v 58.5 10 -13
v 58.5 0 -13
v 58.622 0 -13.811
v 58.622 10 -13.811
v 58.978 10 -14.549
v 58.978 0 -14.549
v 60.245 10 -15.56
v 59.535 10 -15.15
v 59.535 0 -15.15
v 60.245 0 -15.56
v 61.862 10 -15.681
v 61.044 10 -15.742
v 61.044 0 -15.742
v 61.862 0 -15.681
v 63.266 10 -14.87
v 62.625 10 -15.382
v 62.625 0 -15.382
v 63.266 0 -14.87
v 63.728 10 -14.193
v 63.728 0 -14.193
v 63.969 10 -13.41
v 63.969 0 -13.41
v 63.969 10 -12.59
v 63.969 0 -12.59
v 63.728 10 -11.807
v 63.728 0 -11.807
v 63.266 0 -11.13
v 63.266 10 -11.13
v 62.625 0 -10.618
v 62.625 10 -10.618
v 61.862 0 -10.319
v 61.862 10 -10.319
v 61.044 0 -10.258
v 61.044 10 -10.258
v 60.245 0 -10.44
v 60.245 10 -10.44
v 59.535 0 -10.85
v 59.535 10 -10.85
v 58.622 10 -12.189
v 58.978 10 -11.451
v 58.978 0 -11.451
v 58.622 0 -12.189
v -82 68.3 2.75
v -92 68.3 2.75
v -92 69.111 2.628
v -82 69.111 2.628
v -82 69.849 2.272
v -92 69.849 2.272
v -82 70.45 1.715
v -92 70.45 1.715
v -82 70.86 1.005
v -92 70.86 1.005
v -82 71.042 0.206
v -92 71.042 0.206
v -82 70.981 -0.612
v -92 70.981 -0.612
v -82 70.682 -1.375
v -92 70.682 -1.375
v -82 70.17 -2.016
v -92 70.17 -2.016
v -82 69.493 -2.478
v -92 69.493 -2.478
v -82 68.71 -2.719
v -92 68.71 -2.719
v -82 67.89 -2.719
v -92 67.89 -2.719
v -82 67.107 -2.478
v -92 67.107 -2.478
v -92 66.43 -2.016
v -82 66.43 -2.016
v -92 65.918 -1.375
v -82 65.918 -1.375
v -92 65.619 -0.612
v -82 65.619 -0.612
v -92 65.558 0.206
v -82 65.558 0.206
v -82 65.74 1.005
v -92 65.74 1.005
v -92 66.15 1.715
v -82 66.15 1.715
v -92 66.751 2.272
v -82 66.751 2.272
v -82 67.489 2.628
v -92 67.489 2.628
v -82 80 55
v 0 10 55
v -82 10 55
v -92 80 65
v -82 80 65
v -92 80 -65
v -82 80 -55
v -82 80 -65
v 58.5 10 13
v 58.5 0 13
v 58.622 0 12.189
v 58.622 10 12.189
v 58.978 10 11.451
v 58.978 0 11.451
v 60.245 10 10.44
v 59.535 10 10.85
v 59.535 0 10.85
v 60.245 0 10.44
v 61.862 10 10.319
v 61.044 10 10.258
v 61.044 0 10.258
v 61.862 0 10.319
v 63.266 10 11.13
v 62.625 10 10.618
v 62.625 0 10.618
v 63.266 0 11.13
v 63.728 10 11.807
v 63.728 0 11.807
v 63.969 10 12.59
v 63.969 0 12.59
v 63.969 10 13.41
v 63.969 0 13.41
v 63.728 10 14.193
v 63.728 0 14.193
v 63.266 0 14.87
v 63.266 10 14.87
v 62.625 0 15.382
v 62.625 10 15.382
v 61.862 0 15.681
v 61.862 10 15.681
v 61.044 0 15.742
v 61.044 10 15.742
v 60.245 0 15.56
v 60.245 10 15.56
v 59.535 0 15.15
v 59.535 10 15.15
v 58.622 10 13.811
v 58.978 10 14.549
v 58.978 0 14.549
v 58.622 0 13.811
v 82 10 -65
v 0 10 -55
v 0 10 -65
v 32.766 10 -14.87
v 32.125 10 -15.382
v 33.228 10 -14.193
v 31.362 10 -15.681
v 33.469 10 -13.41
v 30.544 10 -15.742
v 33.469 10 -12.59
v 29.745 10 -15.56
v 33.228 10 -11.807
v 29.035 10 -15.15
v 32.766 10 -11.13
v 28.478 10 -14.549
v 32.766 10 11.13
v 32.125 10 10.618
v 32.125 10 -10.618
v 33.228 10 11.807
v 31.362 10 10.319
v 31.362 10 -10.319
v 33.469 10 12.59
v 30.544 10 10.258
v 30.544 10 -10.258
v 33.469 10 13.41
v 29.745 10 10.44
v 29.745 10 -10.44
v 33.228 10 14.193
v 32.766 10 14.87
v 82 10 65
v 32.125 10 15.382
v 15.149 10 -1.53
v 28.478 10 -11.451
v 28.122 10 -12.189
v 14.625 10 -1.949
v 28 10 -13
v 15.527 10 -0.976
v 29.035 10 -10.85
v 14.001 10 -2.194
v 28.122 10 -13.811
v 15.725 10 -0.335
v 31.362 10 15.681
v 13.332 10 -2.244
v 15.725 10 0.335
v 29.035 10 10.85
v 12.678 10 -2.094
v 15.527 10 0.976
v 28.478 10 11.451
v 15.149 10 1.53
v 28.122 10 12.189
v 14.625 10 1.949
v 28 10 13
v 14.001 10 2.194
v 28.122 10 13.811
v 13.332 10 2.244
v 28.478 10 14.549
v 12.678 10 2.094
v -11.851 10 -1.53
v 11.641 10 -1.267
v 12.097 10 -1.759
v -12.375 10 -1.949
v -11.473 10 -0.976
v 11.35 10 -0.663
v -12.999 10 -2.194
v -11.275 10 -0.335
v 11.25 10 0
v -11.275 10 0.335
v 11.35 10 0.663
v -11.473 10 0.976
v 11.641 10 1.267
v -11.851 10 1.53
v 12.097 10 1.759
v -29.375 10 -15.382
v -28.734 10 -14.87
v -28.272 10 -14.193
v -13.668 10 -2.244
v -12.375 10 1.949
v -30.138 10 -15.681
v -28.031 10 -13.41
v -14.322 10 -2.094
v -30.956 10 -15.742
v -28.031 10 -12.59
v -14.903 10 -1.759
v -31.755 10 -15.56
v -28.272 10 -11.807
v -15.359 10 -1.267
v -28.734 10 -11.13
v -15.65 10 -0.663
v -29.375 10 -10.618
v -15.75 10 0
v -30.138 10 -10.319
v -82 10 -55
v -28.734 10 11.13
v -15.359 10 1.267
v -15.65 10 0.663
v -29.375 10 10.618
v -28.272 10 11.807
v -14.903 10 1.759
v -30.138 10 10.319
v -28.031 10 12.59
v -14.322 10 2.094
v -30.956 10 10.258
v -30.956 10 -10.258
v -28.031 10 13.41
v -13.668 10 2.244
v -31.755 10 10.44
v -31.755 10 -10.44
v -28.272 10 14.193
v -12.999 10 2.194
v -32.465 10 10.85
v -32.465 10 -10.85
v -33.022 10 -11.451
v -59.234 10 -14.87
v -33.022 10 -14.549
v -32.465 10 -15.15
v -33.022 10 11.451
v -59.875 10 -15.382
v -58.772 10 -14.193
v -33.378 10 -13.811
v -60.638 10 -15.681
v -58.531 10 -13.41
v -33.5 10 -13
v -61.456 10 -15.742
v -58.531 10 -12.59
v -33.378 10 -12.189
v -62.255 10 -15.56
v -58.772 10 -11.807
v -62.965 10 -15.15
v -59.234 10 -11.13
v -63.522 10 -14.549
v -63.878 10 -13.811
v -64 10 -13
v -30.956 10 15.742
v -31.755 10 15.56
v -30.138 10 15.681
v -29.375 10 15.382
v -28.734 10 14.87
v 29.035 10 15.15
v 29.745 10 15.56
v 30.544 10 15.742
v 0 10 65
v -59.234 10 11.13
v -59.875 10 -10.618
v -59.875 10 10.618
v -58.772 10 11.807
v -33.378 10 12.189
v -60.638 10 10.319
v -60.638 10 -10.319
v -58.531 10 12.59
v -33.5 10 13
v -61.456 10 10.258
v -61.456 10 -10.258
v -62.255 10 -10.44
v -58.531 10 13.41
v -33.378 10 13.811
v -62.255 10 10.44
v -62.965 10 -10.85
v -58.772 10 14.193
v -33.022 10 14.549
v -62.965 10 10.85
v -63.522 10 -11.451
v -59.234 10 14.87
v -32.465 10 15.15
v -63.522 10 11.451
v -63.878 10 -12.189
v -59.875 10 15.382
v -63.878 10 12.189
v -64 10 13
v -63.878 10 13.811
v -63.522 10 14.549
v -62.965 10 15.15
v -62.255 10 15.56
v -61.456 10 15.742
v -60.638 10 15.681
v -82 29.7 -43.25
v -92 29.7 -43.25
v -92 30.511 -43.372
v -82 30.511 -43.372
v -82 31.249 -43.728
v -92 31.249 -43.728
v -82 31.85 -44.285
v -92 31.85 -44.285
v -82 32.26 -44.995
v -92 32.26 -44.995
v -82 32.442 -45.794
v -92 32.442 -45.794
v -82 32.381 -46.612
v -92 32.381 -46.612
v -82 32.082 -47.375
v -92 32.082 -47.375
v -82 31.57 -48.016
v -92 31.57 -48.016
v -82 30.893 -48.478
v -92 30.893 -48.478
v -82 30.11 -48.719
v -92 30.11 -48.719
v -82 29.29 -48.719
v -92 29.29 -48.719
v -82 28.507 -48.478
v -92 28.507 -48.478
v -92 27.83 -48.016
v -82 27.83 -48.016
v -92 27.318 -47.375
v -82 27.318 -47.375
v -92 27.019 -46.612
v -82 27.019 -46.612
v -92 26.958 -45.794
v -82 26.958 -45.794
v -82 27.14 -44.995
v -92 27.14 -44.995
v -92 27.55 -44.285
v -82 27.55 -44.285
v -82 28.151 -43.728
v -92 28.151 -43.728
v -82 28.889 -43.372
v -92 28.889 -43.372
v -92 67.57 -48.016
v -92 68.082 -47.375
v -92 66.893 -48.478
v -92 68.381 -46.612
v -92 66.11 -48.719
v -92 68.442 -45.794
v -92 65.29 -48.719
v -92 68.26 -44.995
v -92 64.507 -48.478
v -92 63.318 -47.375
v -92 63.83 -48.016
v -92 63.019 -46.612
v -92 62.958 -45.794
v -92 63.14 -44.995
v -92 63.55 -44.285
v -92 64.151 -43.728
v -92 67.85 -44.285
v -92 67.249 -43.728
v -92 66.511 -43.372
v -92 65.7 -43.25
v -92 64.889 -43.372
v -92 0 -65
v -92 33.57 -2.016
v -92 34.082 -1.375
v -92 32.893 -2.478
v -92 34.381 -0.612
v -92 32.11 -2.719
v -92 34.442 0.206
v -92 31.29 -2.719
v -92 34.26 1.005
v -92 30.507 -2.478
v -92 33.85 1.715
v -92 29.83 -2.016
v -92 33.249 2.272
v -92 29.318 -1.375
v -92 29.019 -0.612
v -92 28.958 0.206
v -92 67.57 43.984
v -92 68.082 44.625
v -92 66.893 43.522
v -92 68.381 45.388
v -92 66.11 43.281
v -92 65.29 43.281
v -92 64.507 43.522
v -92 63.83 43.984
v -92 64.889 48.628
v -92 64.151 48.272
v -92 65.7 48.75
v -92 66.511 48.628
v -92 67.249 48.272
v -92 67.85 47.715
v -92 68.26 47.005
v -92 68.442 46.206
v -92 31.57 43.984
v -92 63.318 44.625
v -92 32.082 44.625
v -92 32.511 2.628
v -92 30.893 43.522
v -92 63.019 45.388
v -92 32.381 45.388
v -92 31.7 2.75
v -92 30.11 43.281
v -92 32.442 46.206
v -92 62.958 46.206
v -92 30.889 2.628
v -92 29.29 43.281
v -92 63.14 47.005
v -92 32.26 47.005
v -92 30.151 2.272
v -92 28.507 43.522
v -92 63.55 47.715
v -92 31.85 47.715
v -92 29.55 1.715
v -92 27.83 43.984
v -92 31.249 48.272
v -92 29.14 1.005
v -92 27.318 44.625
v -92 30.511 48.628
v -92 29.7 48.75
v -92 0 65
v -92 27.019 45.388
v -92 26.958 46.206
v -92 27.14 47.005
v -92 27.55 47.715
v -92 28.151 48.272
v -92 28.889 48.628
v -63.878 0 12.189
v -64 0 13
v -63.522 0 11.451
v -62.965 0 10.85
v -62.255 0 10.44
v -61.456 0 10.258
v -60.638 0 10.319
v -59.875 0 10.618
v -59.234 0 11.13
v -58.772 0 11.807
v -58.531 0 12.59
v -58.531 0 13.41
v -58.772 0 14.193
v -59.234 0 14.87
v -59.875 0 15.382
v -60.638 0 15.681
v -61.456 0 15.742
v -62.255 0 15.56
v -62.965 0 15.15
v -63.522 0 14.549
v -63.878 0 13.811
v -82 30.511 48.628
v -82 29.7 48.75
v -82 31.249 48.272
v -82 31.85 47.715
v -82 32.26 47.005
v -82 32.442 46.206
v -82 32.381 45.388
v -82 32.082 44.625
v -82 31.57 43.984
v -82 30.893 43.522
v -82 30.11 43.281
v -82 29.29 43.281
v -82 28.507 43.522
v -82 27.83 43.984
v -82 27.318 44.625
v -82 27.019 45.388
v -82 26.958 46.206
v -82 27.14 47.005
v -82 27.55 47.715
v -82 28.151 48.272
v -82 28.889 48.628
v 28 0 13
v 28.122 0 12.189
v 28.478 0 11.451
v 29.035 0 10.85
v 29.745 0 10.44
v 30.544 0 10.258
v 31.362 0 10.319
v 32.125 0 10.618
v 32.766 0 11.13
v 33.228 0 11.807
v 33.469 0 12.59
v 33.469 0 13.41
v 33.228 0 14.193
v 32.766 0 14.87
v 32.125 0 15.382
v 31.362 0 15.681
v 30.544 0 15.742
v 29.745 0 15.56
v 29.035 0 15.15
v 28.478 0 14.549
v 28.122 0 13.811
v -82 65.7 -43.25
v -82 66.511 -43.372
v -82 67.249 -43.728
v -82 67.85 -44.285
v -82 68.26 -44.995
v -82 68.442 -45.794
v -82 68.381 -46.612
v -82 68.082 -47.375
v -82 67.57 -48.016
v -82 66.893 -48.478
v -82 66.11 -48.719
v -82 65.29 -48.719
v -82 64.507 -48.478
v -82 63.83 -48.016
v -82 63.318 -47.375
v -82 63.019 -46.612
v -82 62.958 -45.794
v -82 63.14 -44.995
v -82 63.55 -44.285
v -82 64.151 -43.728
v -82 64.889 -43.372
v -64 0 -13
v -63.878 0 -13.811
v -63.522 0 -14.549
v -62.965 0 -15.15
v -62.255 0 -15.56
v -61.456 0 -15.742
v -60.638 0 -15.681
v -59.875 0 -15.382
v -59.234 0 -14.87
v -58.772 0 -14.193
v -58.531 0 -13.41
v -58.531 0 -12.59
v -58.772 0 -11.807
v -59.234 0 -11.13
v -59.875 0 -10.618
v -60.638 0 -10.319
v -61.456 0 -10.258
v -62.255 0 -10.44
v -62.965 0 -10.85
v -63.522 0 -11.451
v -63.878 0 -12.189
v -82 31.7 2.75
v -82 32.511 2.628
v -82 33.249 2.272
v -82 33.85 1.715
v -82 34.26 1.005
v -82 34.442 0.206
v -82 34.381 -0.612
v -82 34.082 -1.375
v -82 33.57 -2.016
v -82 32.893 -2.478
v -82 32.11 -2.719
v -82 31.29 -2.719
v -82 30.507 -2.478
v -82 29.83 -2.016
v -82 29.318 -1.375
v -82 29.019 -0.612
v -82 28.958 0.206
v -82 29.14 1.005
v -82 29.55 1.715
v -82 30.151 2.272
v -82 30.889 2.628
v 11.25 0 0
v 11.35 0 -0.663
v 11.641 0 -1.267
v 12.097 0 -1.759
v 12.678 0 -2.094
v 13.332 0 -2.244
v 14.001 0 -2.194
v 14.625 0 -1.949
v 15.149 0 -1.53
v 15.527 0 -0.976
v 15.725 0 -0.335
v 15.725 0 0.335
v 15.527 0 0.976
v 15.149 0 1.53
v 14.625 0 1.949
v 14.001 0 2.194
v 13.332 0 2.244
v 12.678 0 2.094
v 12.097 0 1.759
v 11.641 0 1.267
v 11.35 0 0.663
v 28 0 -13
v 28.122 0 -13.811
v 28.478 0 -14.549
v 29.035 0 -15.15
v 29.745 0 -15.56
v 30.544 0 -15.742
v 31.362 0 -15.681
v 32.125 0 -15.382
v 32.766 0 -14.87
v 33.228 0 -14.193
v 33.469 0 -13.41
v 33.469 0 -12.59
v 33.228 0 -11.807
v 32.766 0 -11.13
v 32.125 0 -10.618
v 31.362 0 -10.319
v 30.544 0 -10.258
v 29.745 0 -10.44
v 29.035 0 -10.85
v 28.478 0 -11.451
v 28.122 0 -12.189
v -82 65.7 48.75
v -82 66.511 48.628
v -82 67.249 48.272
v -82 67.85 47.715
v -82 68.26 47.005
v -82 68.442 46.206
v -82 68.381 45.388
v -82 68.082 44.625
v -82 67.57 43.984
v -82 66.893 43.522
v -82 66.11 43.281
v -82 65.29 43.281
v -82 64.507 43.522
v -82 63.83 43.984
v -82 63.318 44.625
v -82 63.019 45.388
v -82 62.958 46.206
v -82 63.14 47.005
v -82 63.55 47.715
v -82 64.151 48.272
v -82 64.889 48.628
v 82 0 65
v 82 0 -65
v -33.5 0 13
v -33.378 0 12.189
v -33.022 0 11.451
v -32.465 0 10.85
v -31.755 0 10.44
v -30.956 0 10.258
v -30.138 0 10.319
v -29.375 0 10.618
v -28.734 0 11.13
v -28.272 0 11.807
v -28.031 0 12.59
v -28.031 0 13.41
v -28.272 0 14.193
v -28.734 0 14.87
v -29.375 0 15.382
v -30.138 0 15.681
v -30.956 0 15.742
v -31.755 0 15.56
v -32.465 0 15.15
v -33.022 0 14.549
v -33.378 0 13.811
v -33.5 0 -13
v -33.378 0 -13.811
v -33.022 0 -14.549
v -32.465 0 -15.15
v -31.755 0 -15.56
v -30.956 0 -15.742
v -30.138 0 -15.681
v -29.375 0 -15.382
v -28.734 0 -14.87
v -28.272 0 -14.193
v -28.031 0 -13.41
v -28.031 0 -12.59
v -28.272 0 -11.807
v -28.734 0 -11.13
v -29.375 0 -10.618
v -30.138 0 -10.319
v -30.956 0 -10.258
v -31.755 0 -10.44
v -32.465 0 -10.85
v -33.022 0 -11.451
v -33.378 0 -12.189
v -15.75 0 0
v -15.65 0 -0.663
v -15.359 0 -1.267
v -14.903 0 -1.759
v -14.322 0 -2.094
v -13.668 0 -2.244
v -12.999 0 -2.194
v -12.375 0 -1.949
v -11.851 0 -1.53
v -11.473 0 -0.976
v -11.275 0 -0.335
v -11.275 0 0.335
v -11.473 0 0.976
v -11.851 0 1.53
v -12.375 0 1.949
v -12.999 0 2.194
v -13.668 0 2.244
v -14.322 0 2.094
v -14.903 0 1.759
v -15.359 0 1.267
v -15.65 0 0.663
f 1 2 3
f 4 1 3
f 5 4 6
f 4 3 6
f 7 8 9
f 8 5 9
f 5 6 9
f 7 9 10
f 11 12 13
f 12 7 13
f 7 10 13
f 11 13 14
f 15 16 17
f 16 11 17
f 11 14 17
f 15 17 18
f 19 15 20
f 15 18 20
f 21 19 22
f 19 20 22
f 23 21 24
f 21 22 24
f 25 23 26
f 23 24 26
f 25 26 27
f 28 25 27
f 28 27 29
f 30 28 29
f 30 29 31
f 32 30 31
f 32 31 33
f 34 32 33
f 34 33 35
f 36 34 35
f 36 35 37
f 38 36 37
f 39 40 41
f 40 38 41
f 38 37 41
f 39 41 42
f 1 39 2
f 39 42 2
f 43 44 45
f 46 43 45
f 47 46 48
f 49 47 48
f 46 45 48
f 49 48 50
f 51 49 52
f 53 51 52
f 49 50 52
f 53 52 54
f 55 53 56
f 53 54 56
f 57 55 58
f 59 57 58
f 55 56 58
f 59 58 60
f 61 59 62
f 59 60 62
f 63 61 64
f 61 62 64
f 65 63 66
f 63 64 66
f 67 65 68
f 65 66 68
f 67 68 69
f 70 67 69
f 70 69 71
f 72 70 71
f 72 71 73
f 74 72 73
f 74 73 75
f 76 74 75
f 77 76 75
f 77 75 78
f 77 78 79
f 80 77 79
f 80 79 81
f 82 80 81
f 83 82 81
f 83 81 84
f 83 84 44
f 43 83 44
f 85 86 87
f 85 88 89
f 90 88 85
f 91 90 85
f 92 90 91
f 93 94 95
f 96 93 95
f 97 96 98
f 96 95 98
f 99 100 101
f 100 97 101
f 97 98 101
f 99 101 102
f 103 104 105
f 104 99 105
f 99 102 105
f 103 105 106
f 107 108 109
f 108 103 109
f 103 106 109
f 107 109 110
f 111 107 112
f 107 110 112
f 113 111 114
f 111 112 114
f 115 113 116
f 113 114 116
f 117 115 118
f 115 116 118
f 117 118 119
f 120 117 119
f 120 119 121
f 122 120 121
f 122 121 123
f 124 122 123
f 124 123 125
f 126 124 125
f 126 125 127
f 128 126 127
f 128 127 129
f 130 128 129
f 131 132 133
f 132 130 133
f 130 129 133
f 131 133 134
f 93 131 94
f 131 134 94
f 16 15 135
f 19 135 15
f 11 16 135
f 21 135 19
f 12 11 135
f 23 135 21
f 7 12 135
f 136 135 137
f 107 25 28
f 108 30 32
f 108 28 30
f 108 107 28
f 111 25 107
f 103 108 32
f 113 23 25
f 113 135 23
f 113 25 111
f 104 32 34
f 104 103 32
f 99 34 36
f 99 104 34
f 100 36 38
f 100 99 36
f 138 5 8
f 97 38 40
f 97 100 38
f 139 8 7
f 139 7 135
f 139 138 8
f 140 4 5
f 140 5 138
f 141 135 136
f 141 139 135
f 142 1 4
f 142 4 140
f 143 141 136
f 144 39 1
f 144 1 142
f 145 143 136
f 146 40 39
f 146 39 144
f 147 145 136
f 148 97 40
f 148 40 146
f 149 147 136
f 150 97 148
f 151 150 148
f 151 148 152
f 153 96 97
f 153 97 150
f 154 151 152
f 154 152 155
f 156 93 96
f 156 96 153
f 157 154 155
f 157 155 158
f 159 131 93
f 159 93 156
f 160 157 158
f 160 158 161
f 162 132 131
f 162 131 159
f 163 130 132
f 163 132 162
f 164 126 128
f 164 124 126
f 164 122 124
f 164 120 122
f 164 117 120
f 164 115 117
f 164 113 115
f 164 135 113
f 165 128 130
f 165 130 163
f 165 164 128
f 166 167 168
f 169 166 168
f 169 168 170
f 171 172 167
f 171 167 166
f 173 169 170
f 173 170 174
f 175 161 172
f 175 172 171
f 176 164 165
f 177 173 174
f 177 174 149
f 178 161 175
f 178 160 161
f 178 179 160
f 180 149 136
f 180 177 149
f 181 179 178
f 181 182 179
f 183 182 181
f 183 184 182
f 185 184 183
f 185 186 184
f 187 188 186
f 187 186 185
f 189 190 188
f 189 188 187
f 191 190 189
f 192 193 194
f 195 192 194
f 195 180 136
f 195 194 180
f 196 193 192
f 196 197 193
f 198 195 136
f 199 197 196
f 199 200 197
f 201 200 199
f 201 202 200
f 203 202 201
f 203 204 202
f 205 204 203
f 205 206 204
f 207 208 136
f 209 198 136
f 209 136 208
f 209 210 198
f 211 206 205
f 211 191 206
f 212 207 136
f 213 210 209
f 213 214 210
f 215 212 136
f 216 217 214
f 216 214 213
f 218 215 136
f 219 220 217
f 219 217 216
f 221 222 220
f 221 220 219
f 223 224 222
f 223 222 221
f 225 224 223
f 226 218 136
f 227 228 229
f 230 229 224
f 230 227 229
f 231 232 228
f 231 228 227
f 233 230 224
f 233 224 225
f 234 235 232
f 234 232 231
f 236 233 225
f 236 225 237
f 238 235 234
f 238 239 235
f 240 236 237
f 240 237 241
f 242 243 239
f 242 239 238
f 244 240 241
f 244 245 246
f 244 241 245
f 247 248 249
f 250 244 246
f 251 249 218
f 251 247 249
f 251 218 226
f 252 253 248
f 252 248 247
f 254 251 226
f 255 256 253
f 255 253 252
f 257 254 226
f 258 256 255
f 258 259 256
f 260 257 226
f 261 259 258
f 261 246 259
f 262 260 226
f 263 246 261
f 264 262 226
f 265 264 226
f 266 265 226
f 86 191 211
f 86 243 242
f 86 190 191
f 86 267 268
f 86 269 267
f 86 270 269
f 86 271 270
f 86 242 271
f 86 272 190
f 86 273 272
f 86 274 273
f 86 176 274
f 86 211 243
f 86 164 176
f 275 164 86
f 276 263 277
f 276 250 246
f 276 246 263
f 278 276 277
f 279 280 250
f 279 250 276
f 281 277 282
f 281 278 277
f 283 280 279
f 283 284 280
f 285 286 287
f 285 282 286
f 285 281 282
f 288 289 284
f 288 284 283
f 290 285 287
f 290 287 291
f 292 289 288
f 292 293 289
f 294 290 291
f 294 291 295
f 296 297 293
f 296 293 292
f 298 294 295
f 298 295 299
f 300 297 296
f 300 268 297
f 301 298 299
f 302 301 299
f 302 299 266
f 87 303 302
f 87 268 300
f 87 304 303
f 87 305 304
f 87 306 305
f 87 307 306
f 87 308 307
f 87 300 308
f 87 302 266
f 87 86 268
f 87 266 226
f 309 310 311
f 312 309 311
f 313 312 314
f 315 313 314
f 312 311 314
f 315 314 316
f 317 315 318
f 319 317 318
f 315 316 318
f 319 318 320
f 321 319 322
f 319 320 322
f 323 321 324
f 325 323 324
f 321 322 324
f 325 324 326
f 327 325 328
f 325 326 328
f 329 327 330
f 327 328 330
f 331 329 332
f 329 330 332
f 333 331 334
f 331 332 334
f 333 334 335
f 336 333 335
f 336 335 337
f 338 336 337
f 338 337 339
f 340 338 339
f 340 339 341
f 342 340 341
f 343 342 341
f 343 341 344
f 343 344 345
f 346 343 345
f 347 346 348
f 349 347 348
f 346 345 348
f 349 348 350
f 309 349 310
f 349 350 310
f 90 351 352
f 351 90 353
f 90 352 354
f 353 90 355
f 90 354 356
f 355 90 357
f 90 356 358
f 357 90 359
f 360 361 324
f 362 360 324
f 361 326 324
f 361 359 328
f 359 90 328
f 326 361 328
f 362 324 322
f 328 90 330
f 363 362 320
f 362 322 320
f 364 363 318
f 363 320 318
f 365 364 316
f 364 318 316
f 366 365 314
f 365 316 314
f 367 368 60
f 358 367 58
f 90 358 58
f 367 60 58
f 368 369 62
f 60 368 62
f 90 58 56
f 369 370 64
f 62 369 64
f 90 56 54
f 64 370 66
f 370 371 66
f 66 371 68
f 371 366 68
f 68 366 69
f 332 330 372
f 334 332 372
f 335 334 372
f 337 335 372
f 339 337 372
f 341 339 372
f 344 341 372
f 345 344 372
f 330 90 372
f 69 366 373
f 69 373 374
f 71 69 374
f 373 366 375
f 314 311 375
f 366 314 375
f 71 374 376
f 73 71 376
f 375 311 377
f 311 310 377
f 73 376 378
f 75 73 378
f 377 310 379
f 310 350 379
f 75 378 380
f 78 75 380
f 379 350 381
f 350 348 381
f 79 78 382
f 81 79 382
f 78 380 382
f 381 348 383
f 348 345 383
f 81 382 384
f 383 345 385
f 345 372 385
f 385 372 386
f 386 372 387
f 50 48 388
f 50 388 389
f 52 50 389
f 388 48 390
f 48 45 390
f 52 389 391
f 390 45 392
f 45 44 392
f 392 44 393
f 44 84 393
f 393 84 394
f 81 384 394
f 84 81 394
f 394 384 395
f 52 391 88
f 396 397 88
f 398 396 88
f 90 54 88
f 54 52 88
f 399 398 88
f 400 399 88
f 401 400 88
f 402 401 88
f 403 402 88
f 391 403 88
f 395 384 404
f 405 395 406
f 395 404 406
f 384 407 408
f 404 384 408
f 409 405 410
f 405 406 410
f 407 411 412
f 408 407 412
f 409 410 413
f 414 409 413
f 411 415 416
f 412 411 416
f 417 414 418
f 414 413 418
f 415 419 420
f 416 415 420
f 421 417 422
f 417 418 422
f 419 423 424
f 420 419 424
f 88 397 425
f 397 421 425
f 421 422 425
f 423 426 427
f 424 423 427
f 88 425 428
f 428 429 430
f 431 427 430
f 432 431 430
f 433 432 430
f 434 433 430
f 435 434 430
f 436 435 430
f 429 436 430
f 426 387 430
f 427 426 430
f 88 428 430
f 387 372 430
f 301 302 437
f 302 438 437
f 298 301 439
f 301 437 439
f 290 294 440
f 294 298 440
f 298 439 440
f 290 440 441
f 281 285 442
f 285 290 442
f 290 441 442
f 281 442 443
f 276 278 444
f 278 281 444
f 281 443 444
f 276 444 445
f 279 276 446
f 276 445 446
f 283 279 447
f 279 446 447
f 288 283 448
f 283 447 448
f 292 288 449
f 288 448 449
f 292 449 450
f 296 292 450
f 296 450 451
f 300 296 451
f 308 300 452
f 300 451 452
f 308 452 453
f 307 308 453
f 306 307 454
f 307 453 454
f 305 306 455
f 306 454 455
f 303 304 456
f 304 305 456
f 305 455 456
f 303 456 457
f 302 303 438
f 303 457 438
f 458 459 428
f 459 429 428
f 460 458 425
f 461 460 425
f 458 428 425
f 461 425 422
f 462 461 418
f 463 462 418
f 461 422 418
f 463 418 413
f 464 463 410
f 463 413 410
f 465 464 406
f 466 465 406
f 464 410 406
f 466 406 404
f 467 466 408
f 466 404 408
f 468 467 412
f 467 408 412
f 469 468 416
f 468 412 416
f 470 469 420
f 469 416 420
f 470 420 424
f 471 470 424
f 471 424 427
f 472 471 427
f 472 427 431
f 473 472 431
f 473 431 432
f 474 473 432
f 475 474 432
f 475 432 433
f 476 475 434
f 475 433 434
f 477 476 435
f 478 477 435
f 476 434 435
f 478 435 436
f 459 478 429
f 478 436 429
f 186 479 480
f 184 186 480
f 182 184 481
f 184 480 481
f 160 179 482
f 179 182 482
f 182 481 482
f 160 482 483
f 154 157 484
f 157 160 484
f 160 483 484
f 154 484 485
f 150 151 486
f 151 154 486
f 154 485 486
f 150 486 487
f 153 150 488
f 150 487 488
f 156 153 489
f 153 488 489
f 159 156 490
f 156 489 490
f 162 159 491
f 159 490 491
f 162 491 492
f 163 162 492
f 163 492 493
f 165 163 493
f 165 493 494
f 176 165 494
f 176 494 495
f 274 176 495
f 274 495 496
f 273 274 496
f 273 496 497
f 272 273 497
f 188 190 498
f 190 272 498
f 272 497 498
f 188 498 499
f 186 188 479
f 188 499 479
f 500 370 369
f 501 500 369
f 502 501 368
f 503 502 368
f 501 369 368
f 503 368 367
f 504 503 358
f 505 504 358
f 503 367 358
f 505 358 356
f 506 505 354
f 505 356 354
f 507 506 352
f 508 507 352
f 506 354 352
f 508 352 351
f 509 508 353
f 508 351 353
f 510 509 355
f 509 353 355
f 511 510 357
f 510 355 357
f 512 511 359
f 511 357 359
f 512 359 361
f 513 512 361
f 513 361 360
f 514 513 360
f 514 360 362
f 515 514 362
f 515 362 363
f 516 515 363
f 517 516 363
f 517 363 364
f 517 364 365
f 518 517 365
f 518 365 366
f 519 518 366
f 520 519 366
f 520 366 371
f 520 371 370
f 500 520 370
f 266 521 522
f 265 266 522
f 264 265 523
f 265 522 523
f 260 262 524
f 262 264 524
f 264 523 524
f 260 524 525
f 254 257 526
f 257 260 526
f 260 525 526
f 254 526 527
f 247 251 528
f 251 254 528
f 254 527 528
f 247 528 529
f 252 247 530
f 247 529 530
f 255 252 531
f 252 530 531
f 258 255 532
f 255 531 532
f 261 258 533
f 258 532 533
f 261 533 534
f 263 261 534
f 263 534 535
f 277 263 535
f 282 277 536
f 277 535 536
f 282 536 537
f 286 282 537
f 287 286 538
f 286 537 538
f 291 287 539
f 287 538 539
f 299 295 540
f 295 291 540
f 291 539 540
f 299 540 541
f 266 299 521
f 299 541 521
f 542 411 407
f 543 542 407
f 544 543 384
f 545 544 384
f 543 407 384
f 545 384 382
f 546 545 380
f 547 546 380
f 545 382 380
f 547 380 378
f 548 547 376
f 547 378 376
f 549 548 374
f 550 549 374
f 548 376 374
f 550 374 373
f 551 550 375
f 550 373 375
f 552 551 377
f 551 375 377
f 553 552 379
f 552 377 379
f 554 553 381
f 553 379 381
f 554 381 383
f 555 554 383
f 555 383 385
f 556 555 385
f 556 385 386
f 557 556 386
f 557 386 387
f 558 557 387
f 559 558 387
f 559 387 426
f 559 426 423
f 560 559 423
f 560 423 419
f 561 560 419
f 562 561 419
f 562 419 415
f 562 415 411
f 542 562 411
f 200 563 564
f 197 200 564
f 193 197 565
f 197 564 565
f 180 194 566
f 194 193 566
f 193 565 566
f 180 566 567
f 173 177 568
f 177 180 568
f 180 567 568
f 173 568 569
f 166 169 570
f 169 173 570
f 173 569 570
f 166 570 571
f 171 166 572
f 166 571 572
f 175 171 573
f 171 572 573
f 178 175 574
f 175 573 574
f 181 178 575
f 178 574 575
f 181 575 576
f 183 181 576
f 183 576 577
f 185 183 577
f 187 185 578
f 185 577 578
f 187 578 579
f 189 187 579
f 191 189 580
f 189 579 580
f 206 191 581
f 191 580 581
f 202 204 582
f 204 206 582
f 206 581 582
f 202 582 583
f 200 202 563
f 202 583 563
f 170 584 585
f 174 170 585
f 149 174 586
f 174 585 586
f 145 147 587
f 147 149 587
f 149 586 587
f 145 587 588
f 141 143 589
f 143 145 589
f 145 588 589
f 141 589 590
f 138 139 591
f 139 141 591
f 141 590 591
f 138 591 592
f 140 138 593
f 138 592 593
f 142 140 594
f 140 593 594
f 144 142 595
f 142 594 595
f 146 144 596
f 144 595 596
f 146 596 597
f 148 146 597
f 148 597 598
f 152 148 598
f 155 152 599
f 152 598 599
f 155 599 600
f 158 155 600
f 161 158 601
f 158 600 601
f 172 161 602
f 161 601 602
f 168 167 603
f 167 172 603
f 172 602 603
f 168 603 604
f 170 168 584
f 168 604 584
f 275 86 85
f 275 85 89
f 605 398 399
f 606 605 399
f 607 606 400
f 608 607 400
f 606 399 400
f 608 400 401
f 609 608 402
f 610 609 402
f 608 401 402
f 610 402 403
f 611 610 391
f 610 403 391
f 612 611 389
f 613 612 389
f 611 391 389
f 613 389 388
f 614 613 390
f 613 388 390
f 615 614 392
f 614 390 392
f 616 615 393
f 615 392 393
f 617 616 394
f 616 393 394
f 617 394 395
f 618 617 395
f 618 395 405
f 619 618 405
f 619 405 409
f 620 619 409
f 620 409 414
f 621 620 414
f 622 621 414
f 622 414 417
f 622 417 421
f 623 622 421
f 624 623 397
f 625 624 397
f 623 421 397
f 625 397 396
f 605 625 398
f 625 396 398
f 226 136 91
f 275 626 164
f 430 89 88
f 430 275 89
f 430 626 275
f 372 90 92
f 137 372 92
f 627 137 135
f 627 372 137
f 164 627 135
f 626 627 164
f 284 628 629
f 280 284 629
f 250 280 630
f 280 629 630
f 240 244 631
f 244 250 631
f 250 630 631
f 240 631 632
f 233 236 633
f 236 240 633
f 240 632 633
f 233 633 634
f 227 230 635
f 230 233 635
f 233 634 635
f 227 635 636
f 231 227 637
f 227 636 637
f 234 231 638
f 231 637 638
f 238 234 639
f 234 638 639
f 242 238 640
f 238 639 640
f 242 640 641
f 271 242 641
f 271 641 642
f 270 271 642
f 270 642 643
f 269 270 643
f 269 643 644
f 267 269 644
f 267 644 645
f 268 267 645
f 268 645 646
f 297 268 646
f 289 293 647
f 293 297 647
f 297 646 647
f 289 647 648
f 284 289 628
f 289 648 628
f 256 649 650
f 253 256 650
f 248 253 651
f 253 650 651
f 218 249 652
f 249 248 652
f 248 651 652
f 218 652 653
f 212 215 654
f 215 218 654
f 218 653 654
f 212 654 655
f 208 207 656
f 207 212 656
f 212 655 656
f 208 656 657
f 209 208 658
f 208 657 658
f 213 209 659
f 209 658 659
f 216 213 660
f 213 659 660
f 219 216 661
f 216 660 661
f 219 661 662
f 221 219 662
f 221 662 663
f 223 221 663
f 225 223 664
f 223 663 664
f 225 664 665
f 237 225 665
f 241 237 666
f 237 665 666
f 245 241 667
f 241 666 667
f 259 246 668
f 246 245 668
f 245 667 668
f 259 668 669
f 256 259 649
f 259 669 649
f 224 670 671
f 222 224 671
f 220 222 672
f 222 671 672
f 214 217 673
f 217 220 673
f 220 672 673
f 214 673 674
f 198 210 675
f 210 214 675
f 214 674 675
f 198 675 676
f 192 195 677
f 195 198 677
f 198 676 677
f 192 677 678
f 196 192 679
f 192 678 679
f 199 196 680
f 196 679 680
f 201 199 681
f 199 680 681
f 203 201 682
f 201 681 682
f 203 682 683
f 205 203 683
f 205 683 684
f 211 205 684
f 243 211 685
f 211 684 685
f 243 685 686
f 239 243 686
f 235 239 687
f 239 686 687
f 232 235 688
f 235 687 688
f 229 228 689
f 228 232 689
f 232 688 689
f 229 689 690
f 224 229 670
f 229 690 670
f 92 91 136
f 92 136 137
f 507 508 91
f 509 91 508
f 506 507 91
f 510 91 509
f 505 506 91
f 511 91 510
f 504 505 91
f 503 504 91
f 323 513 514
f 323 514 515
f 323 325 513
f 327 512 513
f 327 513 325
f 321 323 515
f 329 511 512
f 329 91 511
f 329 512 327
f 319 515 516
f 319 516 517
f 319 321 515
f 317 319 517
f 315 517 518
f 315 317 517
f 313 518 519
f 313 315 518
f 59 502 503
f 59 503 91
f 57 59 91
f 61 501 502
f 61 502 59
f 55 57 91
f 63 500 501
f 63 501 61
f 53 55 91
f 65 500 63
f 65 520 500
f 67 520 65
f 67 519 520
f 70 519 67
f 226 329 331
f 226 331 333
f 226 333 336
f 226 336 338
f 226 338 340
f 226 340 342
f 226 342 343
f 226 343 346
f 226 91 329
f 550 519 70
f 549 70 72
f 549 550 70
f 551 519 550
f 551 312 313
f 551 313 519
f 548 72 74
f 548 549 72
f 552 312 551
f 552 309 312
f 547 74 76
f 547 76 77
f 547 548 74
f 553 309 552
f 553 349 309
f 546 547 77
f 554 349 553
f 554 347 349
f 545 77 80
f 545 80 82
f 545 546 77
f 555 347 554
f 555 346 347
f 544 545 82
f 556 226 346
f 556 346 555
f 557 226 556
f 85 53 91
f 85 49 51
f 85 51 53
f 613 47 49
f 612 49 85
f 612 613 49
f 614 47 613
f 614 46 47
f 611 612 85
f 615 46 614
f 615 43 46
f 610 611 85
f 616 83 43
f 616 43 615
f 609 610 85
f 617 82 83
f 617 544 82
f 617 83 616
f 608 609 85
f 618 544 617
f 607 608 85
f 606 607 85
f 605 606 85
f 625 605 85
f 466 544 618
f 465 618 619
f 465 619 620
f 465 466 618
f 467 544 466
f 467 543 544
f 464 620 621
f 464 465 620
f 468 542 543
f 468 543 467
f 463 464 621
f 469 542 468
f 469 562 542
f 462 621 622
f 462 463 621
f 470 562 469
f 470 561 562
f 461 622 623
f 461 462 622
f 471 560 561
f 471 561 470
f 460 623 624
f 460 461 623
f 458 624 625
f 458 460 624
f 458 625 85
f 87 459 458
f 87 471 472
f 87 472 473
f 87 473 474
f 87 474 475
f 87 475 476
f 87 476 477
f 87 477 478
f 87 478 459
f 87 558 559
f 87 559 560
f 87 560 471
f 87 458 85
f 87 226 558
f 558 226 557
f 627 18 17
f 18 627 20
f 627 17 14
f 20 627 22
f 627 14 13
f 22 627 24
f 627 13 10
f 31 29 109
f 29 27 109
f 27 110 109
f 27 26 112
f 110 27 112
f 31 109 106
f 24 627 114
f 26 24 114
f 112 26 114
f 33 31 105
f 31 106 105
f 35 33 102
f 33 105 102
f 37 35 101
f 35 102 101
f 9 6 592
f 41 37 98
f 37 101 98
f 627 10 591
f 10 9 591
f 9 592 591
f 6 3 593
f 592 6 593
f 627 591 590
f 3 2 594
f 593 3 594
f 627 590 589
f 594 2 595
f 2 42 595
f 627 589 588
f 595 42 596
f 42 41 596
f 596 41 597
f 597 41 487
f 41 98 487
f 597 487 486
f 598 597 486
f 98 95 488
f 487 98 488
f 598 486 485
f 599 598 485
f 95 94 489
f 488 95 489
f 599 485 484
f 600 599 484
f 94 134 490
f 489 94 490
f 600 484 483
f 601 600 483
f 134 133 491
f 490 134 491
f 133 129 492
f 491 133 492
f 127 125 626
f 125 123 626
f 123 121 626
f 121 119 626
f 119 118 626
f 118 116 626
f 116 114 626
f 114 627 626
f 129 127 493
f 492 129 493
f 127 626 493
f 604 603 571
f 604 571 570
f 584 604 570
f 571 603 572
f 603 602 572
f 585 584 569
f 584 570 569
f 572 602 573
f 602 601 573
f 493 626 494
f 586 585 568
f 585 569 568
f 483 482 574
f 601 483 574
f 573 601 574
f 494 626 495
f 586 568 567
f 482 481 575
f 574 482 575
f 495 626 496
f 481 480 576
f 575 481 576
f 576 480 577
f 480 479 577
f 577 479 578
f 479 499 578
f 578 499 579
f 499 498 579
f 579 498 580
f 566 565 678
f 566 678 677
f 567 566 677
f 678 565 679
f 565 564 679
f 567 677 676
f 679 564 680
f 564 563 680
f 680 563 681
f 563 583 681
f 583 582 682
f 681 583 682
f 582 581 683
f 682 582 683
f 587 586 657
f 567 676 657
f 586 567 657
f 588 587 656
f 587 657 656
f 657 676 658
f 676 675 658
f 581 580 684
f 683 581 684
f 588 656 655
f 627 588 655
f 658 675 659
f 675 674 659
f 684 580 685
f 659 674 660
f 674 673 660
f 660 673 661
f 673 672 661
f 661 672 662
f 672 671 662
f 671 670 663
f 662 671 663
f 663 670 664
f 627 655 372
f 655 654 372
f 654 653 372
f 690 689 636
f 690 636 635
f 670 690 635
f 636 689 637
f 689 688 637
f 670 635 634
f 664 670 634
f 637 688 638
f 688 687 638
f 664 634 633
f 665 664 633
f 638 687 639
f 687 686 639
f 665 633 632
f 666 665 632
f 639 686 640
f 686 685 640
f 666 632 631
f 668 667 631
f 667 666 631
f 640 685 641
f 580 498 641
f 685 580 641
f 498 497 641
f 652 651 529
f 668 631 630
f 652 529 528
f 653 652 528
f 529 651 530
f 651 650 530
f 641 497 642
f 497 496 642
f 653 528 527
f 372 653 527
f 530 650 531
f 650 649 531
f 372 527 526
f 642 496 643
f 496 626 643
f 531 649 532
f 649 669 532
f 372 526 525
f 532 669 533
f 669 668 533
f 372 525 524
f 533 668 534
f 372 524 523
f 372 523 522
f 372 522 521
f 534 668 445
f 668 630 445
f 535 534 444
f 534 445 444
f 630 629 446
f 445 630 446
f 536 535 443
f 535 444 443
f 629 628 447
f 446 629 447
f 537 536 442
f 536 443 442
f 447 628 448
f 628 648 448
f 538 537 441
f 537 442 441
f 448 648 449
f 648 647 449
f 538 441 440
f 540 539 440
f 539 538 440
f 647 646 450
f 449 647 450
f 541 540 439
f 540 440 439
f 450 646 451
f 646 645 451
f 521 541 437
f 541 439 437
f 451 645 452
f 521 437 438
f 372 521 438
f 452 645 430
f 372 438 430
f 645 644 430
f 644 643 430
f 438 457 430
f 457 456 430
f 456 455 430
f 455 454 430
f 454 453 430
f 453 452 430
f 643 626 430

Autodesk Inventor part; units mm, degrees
ref_plane "YZ Plane" through (0, 0, 0) normal (1, 0, 0) x (0, 1, 0)
ref_plane "XZ Plane" through (0, 0, 0) normal (0, 1, 0) x (-1, 0, 0)
ref_plane "XY Plane" through (0, 0, 0) normal (0, 0, 1) x (1, 0, 0)
sketch "Sketch1" plane through (0, 0, 0) normal (0, 1, 0) x (-1, 0, 0)
  line L0 (20, -4.85) -> (-20, -4.85) construction
  line L1 (-20, -4.85) -> (-20, 4.85) construction
  line L2 (-20, 4.85) -> (20, 4.85) construction
  line L3 (20, 4.85) -> (20, -4.85) construction
  line L4 (0, -4.85) -> (0, 4.85) construction
  line L5 (20, 0) -> (-20, 0) construction
  circle A0 centre (13.5, 0) radius 2.25
  circle A1 centre (-13.5, 0) radius 2.25
  line L6 (67, -18) -> (25, -18) construction
  line L7 (25, -18) -> (25, 18) construction
  line L8 (25, 18) -> (67, 18) construction
  line L9 (67, 18) -> (67, -18) construction
  line L10 (46, -18) -> (46, 18) construction
  line L11 (67, 0) -> (25, 0) construction
  circle A2 centre (61.25, -13) radius 2.75
  circle A3 centre (30.75, -13) radius 2.75
  circle A4 centre (61.25, 13) radius 2.75
  circle A5 centre (30.75, 13) radius 2.75
  line L12 (-67, -18) -> (-25, -18) construction
  line L13 (-25, -18) -> (-25, 18) construction
  line L14 (-25, 18) -> (-67, 18) construction
  line L15 (-67, 18) -> (-67, -18) construction
  line L16 (-46, -18) -> (-46, 18) construction
  line L17 (-67, 0) -> (-25, 0) construction
  circle A6 centre (-61.25, -13) radius 2.75
  circle A7 centre (-30.75, -13) radius 2.75
  circle A8 centre (-61.25, 13) radius 2.75
  circle A9 centre (-30.75, 13) radius 2.75
  line L18 (82, -65) -> (-82, -65)
  line L19 (-82, -65) -> (-82, 65)
  line L20 (-82, 65) -> (82, 65)
  line L21 (82, 65) -> (82, -65)
  point P0 (0, 0)
  point P1 (0, 0)
  dimension "d0" = 40
  dimension "d1" = 9.7
  dimension "d2" = 4.5
  dimension "d3" = 27
  dimension "d4" = 42
  dimension "d6" = 36
  dimension "d7" = 5
  dimension "d8" = 5.5
  dimension "d9" = 30.5
  dimension "d10" = 26
  dimension "d12" = 15
  dimension "d16" = 130
extrude "Extrusion1" add sketch "Sketch1" along normal blind 10
sketch "Sketch5" plane through (-82, 0, -65) normal (-1, 0, 0) x (0, 0, 1)
  line L0 (0, 0) -> (130, 0) projected
  line L1 (130, 0) -> (130, 10) projected
  line L2 (0, 10) -> (130, 10) projected
  line L3 (0, 0) -> (0, 10) projected
  point P0 (65, 0)
extrude "Extrusion4" add sketch "Sketch5" along normal blind 10
sketch "Sketch6" plane through (0, 10, 0) normal (0, 1, 0) x (1, 0, 0)
  line L0 (-92, 65) -> (-92, -65) projected
  line L1 (82, -65) -> (-92, -65) projected
  line L2 (-92, 65) -> (-82, 65)
  line L3 (-82, 65) -> (-82, -65)
  line L4 (-82, -65) -> (-92, -65)
  line L5 (-92, -65) -> (-92, 65)
  point P0 (0, 0)
  dimension "d33" = 10
extrude "Extrusion5" add sketch "Sketch6" along normal blind 80
sketch "Sketch7" plane through (-82, 10, 65) normal (1, 0, 0) x (0, 0, -1)
  line L0 (35, 10) -> (95, 10)
  line L1 (95, 10) -> (95, 70)
  line L2 (95, 70) -> (35, 70)
  line L3 (35, 70) -> (35, 10)
  line L4 (130, 80) -> (0, 80) construction
  line L5 (65, 80) -> (65, 0) construction
  line L6 (62.75, 0) -> (67.25, 0) construction
  line L7 (0, -10) -> (0, 80) construction
  line L8 (130, -10) -> (130, 80) construction
  line L9 (130, 40) -> (0, 40) construction
  point P0 (65, -10)
  dimension "d36" = 60
  dimension "d37" = 60
  dimension "d38" = 40
extrude "Extrusion6" add sketch "Sketch7" along normal blind 10
sketch "Sketch8" plane through (0, 90, 0) normal (0, 1, 0) x (1, 0, 0)
  line L0 (-92, 65) -> (-92, -65) projected
  line L1 (-92, -65) -> (-82, -65) projected
  line L2 (-82, -65) -> (-82, 65) projected
  line L3 (-82, 65) -> (-92, 65) projected
  point P0 (0, 0)
extrude "Extrusion7" cut sketch "Sketch8" against normal up to surface (10 mm away)
sketch "Sketch9" plane through (-72, 10, 65) normal (1, 0, 0) x (0, 0, -1)
  line L0 (95, 10) -> (95, 70) construction
  line L1 (95, 70) -> (35, 70) construction
  line L2 (35, 70) -> (35, 10) construction
  line L3 (35, 10) -> (95, 10) construction
  line L4 (35, 10) -> (35, 70) construction
  line L5 (35, 40) -> (95, 40) construction
  line L6 (95, 10) -> (95, 70) construction
  line L7 (35, 10) -> (95, 10) construction
  line L8 (65, 10) -> (65, 70) construction
  line L9 (95, 70) -> (35, 70) construction
  line L10 (41.45, 63.55) -> (88.55, 63.55) construction
  line L11 (88.55, 63.55) -> (88.55, 16.45) construction
  line L12 (88.55, 16.45) -> (41.45, 16.45) construction
  line L13 (41.45, 16.45) -> (41.45, 63.55) construction
  circle A0 centre (41.45, 63.55) radius 2.75
  circle A1 centre (41.45, 16.45) radius 2.75
  circle A2 centre (88.55, 16.45) radius 2.75
  circle A3 centre (88.55, 63.55) radius 2.75
  circle A4 centre (65, 40) radius 19.05
  point P0 (65, -10)
  dimension "d43" = 47.1
  dimension "d44" = 47.1
  dimension "d45" = 5.5
  dimension "d46" = 5.5
  dimension "d47" = 5.5
  dimension "d48" = 5.5
  dimension "d51" = 38.1
extrude "Extrusion8" cut sketch "Sketch9" against normal through all
sketch "Sketch10" plane through (-92, 0, -65) normal (-1, 0, 0) x (0, 0, 1)
  circle A0 centre (65, 50) radius 19.05 projected
  line L0 (65, 50) -> (0, 50) construction
  line L1 (0, 10) -> (0, 80) projected
  line L2 (65, 50) -> (130, 50) construction
  line L3 (130, 10) -> (130, 80) projected
  line L4 (5, 71.2) -> (33, 71.2) construction
  line L5 (33, 71.2) -> (33, 24.2) construction
  line L6 (33, 24.2) -> (5, 24.2) construction
  line L7 (5, 24.2) -> (5, 71.2) construction
  line L8 (5, 47.7) -> (33, 47.7) construction
  line L9 (65, 50) -> (65, 0) construction
  line L10 (19, 71.2) -> (19, 24.2) construction
  circle A1 centre (19, 65.7) radius 2.75
  circle A2 centre (19, 29.7) radius 2.75
  circle A3 centre (111, 65.7) radius 2.75
  circle A4 centre (111, 29.7) radius 2.75
  point P0 (180, 80)
  dimension "d52" = 28
  dimension "d53" = 47
  dimension "d54" = 2.3
  dimension "d55" = 46
  dimension "d56" = 5.5
  dimension "d57" = 36
extrude "Extrusion9" cut sketch "Sketch10" against normal through all contours A1 | A2 | A3 | A4
sketch "Sketch12" plane through (0, 10, 0) normal (0, 1, 0) x (1, 0, 0)
  line L0 (82, 65) -> (-82, 65) projected
  line L1 (-82, 65) -> (0, 65)
  line L2 (0, 65) -> (0, 55)
  line L3 (0, 55) -> (-82, 55)
  line L4 (-82, 55) -> (-82, 65)
  line L5 (82, -65) -> (82, 65) construction
  line L6 (82, 0) -> (-92, 0) construction
  line L7 (-92, 65) -> (-92, -65) construction
  line L8 (-82, -65) -> (0, -65)
  line L9 (0, -65) -> (0, -55)
  line L10 (0, -55) -> (-82, -55)
  line L11 (-82, -55) -> (-82, -65)
  point P0 (0, 0)
  dimension "d70" = 82
  dimension "d71" = 10
extrude "Extrusion11" add sketch "Sketch12" along normal up to surface (70 mm away)
chamfer "Chamfer3" distance 70 distance2 82 1 edges at (0, 80, -60) measured on face at (0, 33.3333, -58.3333)
chamfer "Chamfer4" distance 70 distance2 82 1 edges at (0, 80, 60) measured on face at (0, 33.3333, 61.6667)
sketch "Sketch13" plane through (-72, 10, 65) normal (1, 0, 0) x (0, 0, -1)
  line L0 (95, 10) -> (35, 10) projected
  line L1 (95, 10) -> (95, 70) projected
  line L2 (35, 10) -> (95, 10)
  line L3 (95, 10) -> (95, 70)
  line L4 (95, 70) -> (35, 70)
  line L5 (35, 70) -> (35, 10)
  point P0 (65, -10)
extrude "Extrusion12" add sketch "Sketch13" against normal blind 20
sketch "Sketch14" plane through (-72, 10, 65) normal (1, 0, 0) x (0, 0, -1)
  line L0 (95, 10) -> (95, 70) projected
  line L1 (95, 70) -> (35, 70) projected
  line L2 (35, 70) -> (35, 10) projected
  line L3 (35, 10) -> (95, 10) projected
  point P0 (65, -10)
extrude "Extrusion13" cut sketch "Sketch14" against normal blind 10
sketch "Sketch15" plane through (-92, 0, -65) normal (-1, 0, 0) x (0, 0, 1)
  circle A0 centre (19, 29.7) radius 2.75 construction
  circle A1 centre (19, 65.7) radius 2.75 construction
  line L0 (19, 29.7) -> (19, 65.7) construction
  circle A2 centre (111, 29.7) radius 2.75 construction
  circle A3 centre (111, 65.7) radius 2.75 construction
  line L1 (111, 29.7) -> (111, 65.7) construction
  line L2 (19, 47.7) -> (111, 47.7) construction
  line L3 (51.5, 74) -> (78.5, 74) construction
  line L4 (78.5, 74) -> (78.5, 26) construction
  line L5 (78.5, 26) -> (51.5, 26) construction
  line L6 (51.5, 26) -> (51.5, 74) construction
  line L7 (51.5, 50) -> (78.5, 50) construction
  line L8 (130, 80) -> (0, 80) construction
  line L9 (65, 80) -> (65, 0) construction
  line L10 (65, 74) -> (65, 26) construction
  circle A4 centre (65, 68.3) radius 2.75
  circle A5 centre (65, 31.7) radius 2.75
  dimension "d84" = 27
  dimension "d85" = 48
  dimension "d86" = 2.3
  dimension "d87" = 5.5
  dimension "d88" = 36.6
extrude "Extrusion14" cut sketch "Sketch15" against normal blind 10
properties part number "positioner_base"
